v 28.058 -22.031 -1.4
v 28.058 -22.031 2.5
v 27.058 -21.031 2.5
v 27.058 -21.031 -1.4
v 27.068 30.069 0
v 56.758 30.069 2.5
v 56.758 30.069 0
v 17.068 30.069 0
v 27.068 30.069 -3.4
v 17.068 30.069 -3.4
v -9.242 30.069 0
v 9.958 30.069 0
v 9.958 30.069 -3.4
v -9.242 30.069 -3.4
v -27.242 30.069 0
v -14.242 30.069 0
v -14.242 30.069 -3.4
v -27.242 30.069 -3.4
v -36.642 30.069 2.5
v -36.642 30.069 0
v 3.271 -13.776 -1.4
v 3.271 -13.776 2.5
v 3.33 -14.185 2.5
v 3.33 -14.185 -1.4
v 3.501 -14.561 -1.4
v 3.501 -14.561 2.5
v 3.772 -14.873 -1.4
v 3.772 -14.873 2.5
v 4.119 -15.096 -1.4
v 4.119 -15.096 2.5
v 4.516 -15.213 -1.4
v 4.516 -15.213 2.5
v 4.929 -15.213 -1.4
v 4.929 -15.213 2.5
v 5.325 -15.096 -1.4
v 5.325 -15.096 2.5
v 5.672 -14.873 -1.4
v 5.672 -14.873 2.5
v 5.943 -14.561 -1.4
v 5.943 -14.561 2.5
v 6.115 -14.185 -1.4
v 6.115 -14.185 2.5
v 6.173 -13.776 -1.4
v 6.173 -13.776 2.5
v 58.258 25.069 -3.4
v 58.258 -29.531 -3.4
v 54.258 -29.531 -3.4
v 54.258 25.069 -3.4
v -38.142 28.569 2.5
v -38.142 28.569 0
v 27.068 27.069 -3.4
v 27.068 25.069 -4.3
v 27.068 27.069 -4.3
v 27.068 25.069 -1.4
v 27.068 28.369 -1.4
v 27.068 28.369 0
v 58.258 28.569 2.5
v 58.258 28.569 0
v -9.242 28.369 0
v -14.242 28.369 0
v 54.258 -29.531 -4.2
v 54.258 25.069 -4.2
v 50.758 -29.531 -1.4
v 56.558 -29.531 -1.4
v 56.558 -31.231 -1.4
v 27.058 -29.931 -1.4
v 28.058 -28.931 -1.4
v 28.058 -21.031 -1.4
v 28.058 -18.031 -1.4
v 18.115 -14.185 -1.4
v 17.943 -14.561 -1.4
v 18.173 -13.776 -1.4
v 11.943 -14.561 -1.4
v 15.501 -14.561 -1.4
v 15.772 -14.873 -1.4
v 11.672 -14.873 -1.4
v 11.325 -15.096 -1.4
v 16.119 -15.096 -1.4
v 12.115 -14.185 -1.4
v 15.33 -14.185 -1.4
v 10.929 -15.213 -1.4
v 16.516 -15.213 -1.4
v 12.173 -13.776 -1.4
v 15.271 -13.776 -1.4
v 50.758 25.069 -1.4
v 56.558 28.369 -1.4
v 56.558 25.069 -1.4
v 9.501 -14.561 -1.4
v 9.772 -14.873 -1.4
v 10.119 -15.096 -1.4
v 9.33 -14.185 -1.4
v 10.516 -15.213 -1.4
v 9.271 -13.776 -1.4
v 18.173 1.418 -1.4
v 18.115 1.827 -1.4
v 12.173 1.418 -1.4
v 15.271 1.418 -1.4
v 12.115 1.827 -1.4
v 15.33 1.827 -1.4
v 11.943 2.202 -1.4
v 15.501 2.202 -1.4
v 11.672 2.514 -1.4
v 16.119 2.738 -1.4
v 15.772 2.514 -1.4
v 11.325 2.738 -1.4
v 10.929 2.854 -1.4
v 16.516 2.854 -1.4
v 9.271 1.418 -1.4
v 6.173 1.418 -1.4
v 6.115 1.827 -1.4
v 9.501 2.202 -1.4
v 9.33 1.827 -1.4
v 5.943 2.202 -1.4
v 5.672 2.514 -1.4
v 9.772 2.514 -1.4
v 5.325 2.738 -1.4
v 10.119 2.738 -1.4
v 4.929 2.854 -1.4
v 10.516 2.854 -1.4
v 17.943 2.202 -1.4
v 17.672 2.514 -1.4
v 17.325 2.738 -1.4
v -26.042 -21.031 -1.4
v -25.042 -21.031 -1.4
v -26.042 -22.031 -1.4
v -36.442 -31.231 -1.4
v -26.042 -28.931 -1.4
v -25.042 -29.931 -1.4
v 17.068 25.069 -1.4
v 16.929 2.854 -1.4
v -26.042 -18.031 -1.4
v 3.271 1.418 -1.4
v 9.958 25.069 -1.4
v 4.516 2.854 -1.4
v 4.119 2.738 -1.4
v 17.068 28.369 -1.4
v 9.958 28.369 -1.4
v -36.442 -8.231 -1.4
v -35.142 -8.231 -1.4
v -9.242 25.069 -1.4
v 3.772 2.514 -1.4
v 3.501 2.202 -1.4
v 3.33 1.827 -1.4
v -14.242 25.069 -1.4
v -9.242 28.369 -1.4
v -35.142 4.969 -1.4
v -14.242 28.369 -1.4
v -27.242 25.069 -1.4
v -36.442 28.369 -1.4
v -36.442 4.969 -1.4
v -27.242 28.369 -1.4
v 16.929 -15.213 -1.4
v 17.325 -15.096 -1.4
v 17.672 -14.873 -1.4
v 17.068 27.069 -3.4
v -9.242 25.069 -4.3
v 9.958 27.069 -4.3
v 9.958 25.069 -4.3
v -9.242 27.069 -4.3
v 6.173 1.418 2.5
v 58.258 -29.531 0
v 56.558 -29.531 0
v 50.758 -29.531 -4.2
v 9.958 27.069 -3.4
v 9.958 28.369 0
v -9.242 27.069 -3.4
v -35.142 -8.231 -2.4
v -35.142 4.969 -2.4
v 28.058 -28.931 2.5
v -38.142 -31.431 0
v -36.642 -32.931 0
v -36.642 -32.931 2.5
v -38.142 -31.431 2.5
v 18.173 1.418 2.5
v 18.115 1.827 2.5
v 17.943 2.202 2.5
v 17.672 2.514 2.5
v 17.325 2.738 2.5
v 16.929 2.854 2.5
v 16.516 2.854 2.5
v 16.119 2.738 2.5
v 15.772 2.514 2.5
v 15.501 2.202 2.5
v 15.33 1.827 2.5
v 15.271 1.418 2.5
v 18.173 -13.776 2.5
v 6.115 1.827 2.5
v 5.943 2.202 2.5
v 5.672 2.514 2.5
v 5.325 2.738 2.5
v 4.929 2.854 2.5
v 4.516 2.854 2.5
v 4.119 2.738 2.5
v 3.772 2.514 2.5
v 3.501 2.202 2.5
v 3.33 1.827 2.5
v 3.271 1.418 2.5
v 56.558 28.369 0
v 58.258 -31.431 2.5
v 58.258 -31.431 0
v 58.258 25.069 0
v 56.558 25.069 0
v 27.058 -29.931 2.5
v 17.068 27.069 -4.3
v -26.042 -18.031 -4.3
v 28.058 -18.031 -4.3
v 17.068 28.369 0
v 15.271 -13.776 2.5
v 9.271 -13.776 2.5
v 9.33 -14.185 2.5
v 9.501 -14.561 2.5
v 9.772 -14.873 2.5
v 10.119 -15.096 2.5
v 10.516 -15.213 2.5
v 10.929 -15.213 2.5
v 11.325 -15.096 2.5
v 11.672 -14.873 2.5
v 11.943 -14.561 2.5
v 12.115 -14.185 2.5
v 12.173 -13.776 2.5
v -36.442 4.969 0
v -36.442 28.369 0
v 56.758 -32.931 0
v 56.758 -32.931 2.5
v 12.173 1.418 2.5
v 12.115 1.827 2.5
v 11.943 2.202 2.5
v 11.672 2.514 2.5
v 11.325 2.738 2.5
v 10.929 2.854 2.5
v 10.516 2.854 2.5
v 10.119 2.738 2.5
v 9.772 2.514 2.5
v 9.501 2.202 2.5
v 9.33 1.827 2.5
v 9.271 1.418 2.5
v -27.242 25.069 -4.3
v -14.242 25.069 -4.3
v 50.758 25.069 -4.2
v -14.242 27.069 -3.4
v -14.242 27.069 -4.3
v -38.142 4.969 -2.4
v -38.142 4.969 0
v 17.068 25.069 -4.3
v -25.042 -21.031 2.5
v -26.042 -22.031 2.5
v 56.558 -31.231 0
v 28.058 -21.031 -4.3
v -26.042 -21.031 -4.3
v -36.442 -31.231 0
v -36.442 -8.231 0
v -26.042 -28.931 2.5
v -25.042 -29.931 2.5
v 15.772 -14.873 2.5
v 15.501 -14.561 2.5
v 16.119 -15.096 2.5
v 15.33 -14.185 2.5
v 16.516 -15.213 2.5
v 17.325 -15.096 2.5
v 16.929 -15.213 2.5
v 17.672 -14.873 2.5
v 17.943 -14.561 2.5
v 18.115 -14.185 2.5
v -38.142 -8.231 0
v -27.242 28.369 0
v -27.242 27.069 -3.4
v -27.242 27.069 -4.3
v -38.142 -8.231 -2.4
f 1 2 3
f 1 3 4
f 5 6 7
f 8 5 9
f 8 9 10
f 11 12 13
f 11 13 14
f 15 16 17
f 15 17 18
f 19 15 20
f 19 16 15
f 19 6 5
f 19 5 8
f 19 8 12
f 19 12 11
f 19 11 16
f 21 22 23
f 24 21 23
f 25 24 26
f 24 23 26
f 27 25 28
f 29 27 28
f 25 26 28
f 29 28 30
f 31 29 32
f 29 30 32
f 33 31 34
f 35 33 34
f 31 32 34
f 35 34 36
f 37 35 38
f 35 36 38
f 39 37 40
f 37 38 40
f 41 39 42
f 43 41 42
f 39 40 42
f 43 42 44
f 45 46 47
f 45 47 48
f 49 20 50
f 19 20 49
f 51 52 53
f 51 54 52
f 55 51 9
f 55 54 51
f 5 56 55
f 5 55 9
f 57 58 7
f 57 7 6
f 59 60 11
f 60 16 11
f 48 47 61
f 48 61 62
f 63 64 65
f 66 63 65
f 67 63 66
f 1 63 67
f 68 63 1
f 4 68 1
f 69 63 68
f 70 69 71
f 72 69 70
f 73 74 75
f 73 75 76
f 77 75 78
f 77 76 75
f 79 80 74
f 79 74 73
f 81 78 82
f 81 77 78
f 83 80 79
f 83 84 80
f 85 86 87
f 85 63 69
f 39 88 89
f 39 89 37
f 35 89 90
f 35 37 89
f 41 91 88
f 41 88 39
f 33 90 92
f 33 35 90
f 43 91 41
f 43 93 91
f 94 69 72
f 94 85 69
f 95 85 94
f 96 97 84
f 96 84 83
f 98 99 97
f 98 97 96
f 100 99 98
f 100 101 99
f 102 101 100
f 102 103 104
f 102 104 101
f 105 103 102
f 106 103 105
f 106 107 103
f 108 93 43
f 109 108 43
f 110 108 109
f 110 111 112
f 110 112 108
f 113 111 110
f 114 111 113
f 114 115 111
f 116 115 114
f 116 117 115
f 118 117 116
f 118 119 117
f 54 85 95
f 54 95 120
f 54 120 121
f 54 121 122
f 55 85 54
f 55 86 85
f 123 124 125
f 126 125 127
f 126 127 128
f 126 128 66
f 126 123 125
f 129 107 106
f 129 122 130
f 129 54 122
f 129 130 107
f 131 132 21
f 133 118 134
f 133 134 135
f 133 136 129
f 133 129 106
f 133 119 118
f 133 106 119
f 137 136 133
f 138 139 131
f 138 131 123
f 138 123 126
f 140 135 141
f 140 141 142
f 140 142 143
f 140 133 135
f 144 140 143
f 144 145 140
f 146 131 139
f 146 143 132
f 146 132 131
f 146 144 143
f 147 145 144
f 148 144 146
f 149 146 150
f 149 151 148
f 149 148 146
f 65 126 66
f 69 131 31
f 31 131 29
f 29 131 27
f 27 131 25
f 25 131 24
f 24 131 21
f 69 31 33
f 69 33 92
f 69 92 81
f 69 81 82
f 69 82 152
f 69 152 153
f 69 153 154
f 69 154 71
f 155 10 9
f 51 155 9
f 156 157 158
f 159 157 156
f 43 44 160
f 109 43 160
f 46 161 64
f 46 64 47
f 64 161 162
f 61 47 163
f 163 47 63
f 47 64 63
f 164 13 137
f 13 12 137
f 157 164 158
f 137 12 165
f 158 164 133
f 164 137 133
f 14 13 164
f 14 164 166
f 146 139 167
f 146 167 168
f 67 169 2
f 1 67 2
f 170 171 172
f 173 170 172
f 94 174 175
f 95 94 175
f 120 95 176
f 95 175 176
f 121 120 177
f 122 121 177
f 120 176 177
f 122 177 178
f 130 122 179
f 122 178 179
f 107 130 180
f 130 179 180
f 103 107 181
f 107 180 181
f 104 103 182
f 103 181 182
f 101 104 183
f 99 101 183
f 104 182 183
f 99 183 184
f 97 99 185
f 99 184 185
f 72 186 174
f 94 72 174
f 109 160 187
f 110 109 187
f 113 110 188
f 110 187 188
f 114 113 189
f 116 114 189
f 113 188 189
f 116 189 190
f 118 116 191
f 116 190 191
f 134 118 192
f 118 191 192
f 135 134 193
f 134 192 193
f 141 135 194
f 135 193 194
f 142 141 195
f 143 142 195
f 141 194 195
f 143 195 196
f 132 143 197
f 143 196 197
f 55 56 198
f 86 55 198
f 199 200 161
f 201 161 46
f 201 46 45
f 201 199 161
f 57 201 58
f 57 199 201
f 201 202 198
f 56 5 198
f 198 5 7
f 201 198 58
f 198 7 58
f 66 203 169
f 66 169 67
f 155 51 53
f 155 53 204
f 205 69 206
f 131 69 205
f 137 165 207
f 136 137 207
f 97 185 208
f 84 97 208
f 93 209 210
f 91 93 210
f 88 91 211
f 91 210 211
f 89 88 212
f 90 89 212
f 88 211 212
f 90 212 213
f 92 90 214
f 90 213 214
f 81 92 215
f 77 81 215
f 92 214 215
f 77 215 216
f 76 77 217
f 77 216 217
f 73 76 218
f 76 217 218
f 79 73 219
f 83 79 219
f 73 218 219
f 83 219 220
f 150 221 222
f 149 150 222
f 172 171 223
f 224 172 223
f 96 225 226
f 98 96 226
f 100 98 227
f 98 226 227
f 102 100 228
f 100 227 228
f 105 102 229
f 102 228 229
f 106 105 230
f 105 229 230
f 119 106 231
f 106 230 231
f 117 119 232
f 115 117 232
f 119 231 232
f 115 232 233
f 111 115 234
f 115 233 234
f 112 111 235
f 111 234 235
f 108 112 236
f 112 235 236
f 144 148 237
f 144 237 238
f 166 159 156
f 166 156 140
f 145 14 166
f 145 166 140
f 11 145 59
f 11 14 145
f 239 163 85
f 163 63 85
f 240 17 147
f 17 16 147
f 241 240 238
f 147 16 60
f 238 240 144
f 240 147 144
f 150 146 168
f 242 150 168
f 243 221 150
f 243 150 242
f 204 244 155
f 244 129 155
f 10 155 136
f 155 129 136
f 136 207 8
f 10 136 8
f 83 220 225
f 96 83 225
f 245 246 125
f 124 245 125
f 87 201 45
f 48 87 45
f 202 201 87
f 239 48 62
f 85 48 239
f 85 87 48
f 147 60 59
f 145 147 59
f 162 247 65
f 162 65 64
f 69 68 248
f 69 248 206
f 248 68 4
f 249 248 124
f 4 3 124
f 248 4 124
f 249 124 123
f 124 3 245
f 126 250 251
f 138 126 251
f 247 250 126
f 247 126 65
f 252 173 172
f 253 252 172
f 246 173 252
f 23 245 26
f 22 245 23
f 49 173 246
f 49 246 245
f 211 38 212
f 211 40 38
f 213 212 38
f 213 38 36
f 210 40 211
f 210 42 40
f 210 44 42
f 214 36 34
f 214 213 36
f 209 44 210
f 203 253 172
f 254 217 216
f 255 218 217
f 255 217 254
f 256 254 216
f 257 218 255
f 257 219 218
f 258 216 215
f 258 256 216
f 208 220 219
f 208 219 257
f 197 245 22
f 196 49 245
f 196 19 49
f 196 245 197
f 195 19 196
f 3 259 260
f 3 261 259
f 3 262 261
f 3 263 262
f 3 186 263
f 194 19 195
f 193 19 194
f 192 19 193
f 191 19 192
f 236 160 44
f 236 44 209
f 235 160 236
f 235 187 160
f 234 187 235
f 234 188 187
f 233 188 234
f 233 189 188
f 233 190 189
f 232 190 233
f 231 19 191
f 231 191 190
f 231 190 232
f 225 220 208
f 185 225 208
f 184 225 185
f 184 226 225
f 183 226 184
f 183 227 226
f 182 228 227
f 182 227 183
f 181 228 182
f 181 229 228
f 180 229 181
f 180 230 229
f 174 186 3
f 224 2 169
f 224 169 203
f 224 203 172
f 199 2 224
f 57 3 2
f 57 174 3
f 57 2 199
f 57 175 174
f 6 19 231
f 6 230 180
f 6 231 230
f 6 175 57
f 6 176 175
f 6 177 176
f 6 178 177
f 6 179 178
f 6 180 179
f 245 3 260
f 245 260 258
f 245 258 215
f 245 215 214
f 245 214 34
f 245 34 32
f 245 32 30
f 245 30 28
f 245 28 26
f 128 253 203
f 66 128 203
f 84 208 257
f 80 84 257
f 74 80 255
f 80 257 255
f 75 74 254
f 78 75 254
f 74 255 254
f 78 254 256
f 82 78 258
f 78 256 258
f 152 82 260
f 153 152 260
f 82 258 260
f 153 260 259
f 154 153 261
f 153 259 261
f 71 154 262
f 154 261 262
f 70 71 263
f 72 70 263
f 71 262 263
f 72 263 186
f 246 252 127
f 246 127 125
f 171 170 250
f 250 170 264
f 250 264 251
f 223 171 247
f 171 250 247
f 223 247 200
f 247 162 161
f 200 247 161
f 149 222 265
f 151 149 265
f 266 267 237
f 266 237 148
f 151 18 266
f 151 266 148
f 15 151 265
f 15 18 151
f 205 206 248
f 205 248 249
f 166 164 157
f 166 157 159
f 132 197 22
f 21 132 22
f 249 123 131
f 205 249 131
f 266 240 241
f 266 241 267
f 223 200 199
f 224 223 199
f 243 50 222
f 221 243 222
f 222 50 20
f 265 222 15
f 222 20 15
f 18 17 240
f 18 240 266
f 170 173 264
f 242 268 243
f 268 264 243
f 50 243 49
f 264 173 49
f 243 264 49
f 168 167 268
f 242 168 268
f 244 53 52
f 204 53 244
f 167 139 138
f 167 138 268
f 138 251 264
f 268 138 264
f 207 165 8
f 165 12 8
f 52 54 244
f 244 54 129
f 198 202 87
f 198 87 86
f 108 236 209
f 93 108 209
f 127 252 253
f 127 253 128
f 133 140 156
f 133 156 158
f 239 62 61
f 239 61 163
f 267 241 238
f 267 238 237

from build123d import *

# Parameters (mm, degrees)
SKETCH1_W            = 96.4
SKETCH1_H            = 63
BOSS_EXTRUDE1_DEPTH  = 2.5
SKETCH1_5_W          = 93
SKETCH1_5_H          = 59.6
BOSS_EXTRUDE2_DEPTH  = 1.4
CHAMFER1_SIZE        = 1.5
SKETCH3_W            = 1.7
SKETCH3_H            = 13.2
BOSS_EXTRUDE4_DEPTH  = 1.7
SKETCH4_W            = 13
SKETCH4_H            = 1.7
SKETCH4_W_2          = 10
SKETCH4_W_3          = 19.2
BOSS_EXTRUDE5_DEPTH  = 1.6
SKETCH4_3_W          = 13
SKETCH4_3_H          = 3
SKETCH4_3_W_2        = 10
SKETCH4_3_W_3        = 19.2
BOSS_EXTRUDE6_DEPTH  = 2
SKETCH3_5_W          = 3
SKETCH3_5_H          = 13.2
BOSS_EXTRUDE7_DEPTH  = 1
SKETCH5_W            = 1.7
SKETCH5_H            = 54.6
BOSS_EXTRUDE8_DEPTH  = 1.6
SKETCH5_3_W          = 3
SKETCH5_3_H          = 54.6
BOSS_EXTRUDE9_DEPTH  = 2
SKETCH7_W            = 54.1
SKETCH7_H            = 8.9
CUT_EXTRUDE2_DEPTH   = 12
CHAMFER2_SIZE        = 1
SKETCH11_W           = 10
SKETCH11_H           = 2
SKETCH11_W_2         = 19.2
SKETCH11_W_3         = 13
BOSS_EXTRUDE10_DEPTH = 2
SKETCH13_W           = 10
SKETCH13_H           = 2
SKETCH13_W_2         = 19.2
SKETCH13_W_3         = 13
BOSS_EXTRUDE12_DEPTH = 0.9
SKETCH14_W           = 54.1
SKETCH14_H           = 3
BOSS_EXTRUDE13_DEPTH = 2.9
SKETCH15_W           = 2
SKETCH15_H           = 54.6
BOSS_EXTRUDE14_DEPTH = 4.5
SKETCH16_W           = 3.5
SKETCH16_H           = 54.6
BOSS_EXTRUDE15_DEPTH = 0.8
CUT_EXTRUDE3_DEPTH   = 10


with BuildPart() as part:
    # Sketch1 → Boss-Extrude1 (new body)
    with BuildSketch(Plane.XY):
        with Locations((10.058192988, -1.431154761)):
            Rectangle(SKETCH1_W, SKETCH1_H)
    extrude(amount=BOSS_EXTRUDE1_DEPTH)

    # Sketch1<5> → Boss-Extrude2 (add)
    with BuildSketch(Plane.XY):
        with Locations((10.058192988, -1.431154761)):
            Rectangle(SKETCH1_5_W, SKETCH1_5_H)
    extrude(amount=-BOSS_EXTRUDE2_DEPTH)

    # Chamfer1
    chamfer1_edges = [part.edges().sort_by_distance(p)[0] for p in [
        (58.258192988, 30.068845239, 1.25),
        (-38.141807012, 30.068845239, 1.25),
        (-38.141807012, -32.931154761, 1.25),
        (58.258192988, -32.931154761, 1.25),
    ]]
    chamfer(chamfer1_edges, length=CHAMFER1_SIZE)

    # Sketch3 → Boss-Extrude4 (add)
    with BuildSketch(Plane(origin=(0, 0, -1.4), x_dir=(-1, 0, 0), z_dir=(0, 0, -1))):
        with Locations((37.291807012, -1.631154761)):
            Rectangle(SKETCH3_W, SKETCH3_H)
    extrude(amount=-BOSS_EXTRUDE4_DEPTH)

    # Sketch4 → Boss-Extrude5 (add)
    with BuildSketch(Plane(origin=(0, 0, -1.4), x_dir=(-1, 0, 0), z_dir=(0, 0, -1))):
        with Locations((20.741807012, 29.218845239)):
            Rectangle(SKETCH4_W, SKETCH4_H)
        with Locations((-22.068192988, 29.218845239)):
            Rectangle(SKETCH4_W_2, SKETCH4_H)
        with Locations((-0.358192988, 29.218845239)):
            Rectangle(SKETCH4_W_3, SKETCH4_H)
    extrude(amount=-BOSS_EXTRUDE5_DEPTH)

    # Sketch4<3> → Boss-Extrude6 (add)
    with BuildSketch(Plane(origin=(0, 0, -1.4), x_dir=(-1, 0, 0), z_dir=(0, 0, -1))):
        with Locations((20.741807012, 28.568845239)):
            Rectangle(SKETCH4_3_W, SKETCH4_3_H)
        with Locations((-22.068192988, 28.568845239)):
            Rectangle(SKETCH4_3_W_2, SKETCH4_3_H)
        with Locations((-0.358192988, 28.568845239)):
            Rectangle(SKETCH4_3_W_3, SKETCH4_3_H)
    extrude(amount=BOSS_EXTRUDE6_DEPTH)

    # Sketch3<5> → Boss-Extrude7 (add)
    with BuildSketch(Plane(origin=(0, 0, -1.4), x_dir=(-1, 0, 0), z_dir=(0, 0, -1))):
        with Locations((36.641807012, -1.631154761)):
            Rectangle(SKETCH3_5_W, SKETCH3_5_H)
    extrude(amount=BOSS_EXTRUDE7_DEPTH)

    # Sketch5 → Boss-Extrude8 (add)
    with BuildSketch(Plane(origin=(0, 0, -1.4), x_dir=(-1, 0, 0), z_dir=(0, 0, -1))):
        with Locations((-57.408192988, -2.231154761)):
            Rectangle(SKETCH5_W, SKETCH5_H)
    extrude(amount=-BOSS_EXTRUDE8_DEPTH)

    # Sketch5<3> → Boss-Extrude9 (add)
    with BuildSketch(Plane(origin=(0, 0, -1.4), x_dir=(-1, 0, 0), z_dir=(0, 0, -1))):
        with Locations((-56.758192988, -2.231154761)):
            Rectangle(SKETCH5_3_W, SKETCH5_3_H)
    extrude(amount=BOSS_EXTRUDE9_DEPTH)

    # Sketch7 → Cut-Extrude2 (cut)
    with BuildSketch(Plane.XY.offset(2.5)):
        with Locations((1.008192988, -25.481154761)):
            Rectangle(SKETCH7_W, SKETCH7_H)
    extrude(amount=-CUT_EXTRUDE2_DEPTH, mode=Mode.SUBTRACT)

    # Chamfer2
    chamfer2_edges = [part.edges().sort_by_distance(p)[0] for p in [
        (28.058192988, -21.031154761, 0.55),
        (28.058192988, -29.931154761, 0.55),
        (-26.041807012, -29.931154761, 0.55),
        (-26.041807012, -21.031154761, 0.55),
    ]]
    chamfer(chamfer2_edges, length=CHAMFER2_SIZE)

    # Sketch11 → Boss-Extrude10 (add)
    with BuildSketch(Plane.XZ.offset(-27.068845239)):
        with Locations((22.068192988, -2.4)):
            Rectangle(SKETCH11_W, SKETCH11_H)
        with Locations((0.358192988, -2.4)):
            Rectangle(SKETCH11_W_2, SKETCH11_H)
        with Locations((-20.741807012, -2.4)):
            Rectangle(SKETCH11_W_3, SKETCH11_H)
    extrude(amount=BOSS_EXTRUDE10_DEPTH)

    # Sketch13 → Boss-Extrude12 (add)
    with BuildSketch(Plane(origin=(0, 0, -3.4), x_dir=(-1, 0, 0), z_dir=(0, 0, -1))):
        with Locations((-22.068192988, 26.068845239)):
            Rectangle(SKETCH13_W, SKETCH13_H)
        with Locations((-0.358192988, 26.068845239)):
            Rectangle(SKETCH13_W_2, SKETCH13_H)
        with Locations((20.741807012, 26.068845239)):
            Rectangle(SKETCH13_W_3, SKETCH13_H)
    extrude(amount=BOSS_EXTRUDE12_DEPTH)

    # Sketch14 → Boss-Extrude13 (add)
    with BuildSketch(Plane(origin=(0, 0, -1.4), x_dir=(-1, 0, 0), z_dir=(0, 0, -1))):
        with Locations((-1.008192988, -19.531154761)):
            Rectangle(SKETCH14_W, SKETCH14_H)
    extrude(amount=BOSS_EXTRUDE13_DEPTH)

    # Sketch15 → Boss-Extrude14 (add)
    with BuildSketch(Plane.ZY.offset(-55.258192988)):
        with Locations((-2.4, -2.231154761)):
            Rectangle(SKETCH15_W, SKETCH15_H)
    extrude(amount=BOSS_EXTRUDE14_DEPTH)

    # Sketch16 → Boss-Extrude15 (add)
    with BuildSketch(Plane(origin=(0, 0, -3.4), x_dir=(-1, 0, 0), z_dir=(0, 0, -1))):
        with Locations((-52.508192988, -2.231154761)):
            Rectangle(SKETCH16_W, SKETCH16_H)
    extrude(amount=BOSS_EXTRUDE15_DEPTH)

    # Sketch17 → Cut-Extrude3 (cut)
    with BuildSketch(Plane.XY.offset(2.5)):
        with BuildLine():
            Line((6.173335738, -13.776270945), (6.173335738, 1.417718204))
            ThreePointArc((6.173335738, 1.417718204), (4.722208704, 2.868845239), (3.271081669, 1.417718204))
            Line((3.271081669, 1.417718204), (3.271081669, -13.776270945))
            ThreePointArc((3.271081669, -13.776270945), (4.722208704, -15.227397979), (6.173335738, -13.776270945))
        make_face()
        with BuildLine():
            Line((12.173335738, -13.776270945), (12.173335738, 1.417718204))
            ThreePointArc((12.173335738, 1.417718204), (10.722208704, 2.868845239), (9.271081669, 1.417718204))
            Line((9.271081669, 1.417718204), (9.271081669, -13.776270945))
            ThreePointArc((9.271081669, -13.776270945), (10.722208704, -15.227397979), (12.173335738, -13.776270945))
        make_face()
        with BuildLine():
            Line((18.173335738, -13.776270945), (18.173335738, 1.417718204))
            ThreePointArc((18.173335738, 1.417718204), (16.722208704, 2.868845239), (15.271081669, 1.417718204))
            Line((15.271081669, 1.417718204), (15.271081669, -13.776270945))
            ThreePointArc((15.271081669, -13.776270945), (16.722208704, -15.227397979), (18.173335738, -13.776270945))
        make_face()
    extrude(amount=-CUT_EXTRUDE3_DEPTH, mode=Mode.SUBTRACT)


solid = part.part
